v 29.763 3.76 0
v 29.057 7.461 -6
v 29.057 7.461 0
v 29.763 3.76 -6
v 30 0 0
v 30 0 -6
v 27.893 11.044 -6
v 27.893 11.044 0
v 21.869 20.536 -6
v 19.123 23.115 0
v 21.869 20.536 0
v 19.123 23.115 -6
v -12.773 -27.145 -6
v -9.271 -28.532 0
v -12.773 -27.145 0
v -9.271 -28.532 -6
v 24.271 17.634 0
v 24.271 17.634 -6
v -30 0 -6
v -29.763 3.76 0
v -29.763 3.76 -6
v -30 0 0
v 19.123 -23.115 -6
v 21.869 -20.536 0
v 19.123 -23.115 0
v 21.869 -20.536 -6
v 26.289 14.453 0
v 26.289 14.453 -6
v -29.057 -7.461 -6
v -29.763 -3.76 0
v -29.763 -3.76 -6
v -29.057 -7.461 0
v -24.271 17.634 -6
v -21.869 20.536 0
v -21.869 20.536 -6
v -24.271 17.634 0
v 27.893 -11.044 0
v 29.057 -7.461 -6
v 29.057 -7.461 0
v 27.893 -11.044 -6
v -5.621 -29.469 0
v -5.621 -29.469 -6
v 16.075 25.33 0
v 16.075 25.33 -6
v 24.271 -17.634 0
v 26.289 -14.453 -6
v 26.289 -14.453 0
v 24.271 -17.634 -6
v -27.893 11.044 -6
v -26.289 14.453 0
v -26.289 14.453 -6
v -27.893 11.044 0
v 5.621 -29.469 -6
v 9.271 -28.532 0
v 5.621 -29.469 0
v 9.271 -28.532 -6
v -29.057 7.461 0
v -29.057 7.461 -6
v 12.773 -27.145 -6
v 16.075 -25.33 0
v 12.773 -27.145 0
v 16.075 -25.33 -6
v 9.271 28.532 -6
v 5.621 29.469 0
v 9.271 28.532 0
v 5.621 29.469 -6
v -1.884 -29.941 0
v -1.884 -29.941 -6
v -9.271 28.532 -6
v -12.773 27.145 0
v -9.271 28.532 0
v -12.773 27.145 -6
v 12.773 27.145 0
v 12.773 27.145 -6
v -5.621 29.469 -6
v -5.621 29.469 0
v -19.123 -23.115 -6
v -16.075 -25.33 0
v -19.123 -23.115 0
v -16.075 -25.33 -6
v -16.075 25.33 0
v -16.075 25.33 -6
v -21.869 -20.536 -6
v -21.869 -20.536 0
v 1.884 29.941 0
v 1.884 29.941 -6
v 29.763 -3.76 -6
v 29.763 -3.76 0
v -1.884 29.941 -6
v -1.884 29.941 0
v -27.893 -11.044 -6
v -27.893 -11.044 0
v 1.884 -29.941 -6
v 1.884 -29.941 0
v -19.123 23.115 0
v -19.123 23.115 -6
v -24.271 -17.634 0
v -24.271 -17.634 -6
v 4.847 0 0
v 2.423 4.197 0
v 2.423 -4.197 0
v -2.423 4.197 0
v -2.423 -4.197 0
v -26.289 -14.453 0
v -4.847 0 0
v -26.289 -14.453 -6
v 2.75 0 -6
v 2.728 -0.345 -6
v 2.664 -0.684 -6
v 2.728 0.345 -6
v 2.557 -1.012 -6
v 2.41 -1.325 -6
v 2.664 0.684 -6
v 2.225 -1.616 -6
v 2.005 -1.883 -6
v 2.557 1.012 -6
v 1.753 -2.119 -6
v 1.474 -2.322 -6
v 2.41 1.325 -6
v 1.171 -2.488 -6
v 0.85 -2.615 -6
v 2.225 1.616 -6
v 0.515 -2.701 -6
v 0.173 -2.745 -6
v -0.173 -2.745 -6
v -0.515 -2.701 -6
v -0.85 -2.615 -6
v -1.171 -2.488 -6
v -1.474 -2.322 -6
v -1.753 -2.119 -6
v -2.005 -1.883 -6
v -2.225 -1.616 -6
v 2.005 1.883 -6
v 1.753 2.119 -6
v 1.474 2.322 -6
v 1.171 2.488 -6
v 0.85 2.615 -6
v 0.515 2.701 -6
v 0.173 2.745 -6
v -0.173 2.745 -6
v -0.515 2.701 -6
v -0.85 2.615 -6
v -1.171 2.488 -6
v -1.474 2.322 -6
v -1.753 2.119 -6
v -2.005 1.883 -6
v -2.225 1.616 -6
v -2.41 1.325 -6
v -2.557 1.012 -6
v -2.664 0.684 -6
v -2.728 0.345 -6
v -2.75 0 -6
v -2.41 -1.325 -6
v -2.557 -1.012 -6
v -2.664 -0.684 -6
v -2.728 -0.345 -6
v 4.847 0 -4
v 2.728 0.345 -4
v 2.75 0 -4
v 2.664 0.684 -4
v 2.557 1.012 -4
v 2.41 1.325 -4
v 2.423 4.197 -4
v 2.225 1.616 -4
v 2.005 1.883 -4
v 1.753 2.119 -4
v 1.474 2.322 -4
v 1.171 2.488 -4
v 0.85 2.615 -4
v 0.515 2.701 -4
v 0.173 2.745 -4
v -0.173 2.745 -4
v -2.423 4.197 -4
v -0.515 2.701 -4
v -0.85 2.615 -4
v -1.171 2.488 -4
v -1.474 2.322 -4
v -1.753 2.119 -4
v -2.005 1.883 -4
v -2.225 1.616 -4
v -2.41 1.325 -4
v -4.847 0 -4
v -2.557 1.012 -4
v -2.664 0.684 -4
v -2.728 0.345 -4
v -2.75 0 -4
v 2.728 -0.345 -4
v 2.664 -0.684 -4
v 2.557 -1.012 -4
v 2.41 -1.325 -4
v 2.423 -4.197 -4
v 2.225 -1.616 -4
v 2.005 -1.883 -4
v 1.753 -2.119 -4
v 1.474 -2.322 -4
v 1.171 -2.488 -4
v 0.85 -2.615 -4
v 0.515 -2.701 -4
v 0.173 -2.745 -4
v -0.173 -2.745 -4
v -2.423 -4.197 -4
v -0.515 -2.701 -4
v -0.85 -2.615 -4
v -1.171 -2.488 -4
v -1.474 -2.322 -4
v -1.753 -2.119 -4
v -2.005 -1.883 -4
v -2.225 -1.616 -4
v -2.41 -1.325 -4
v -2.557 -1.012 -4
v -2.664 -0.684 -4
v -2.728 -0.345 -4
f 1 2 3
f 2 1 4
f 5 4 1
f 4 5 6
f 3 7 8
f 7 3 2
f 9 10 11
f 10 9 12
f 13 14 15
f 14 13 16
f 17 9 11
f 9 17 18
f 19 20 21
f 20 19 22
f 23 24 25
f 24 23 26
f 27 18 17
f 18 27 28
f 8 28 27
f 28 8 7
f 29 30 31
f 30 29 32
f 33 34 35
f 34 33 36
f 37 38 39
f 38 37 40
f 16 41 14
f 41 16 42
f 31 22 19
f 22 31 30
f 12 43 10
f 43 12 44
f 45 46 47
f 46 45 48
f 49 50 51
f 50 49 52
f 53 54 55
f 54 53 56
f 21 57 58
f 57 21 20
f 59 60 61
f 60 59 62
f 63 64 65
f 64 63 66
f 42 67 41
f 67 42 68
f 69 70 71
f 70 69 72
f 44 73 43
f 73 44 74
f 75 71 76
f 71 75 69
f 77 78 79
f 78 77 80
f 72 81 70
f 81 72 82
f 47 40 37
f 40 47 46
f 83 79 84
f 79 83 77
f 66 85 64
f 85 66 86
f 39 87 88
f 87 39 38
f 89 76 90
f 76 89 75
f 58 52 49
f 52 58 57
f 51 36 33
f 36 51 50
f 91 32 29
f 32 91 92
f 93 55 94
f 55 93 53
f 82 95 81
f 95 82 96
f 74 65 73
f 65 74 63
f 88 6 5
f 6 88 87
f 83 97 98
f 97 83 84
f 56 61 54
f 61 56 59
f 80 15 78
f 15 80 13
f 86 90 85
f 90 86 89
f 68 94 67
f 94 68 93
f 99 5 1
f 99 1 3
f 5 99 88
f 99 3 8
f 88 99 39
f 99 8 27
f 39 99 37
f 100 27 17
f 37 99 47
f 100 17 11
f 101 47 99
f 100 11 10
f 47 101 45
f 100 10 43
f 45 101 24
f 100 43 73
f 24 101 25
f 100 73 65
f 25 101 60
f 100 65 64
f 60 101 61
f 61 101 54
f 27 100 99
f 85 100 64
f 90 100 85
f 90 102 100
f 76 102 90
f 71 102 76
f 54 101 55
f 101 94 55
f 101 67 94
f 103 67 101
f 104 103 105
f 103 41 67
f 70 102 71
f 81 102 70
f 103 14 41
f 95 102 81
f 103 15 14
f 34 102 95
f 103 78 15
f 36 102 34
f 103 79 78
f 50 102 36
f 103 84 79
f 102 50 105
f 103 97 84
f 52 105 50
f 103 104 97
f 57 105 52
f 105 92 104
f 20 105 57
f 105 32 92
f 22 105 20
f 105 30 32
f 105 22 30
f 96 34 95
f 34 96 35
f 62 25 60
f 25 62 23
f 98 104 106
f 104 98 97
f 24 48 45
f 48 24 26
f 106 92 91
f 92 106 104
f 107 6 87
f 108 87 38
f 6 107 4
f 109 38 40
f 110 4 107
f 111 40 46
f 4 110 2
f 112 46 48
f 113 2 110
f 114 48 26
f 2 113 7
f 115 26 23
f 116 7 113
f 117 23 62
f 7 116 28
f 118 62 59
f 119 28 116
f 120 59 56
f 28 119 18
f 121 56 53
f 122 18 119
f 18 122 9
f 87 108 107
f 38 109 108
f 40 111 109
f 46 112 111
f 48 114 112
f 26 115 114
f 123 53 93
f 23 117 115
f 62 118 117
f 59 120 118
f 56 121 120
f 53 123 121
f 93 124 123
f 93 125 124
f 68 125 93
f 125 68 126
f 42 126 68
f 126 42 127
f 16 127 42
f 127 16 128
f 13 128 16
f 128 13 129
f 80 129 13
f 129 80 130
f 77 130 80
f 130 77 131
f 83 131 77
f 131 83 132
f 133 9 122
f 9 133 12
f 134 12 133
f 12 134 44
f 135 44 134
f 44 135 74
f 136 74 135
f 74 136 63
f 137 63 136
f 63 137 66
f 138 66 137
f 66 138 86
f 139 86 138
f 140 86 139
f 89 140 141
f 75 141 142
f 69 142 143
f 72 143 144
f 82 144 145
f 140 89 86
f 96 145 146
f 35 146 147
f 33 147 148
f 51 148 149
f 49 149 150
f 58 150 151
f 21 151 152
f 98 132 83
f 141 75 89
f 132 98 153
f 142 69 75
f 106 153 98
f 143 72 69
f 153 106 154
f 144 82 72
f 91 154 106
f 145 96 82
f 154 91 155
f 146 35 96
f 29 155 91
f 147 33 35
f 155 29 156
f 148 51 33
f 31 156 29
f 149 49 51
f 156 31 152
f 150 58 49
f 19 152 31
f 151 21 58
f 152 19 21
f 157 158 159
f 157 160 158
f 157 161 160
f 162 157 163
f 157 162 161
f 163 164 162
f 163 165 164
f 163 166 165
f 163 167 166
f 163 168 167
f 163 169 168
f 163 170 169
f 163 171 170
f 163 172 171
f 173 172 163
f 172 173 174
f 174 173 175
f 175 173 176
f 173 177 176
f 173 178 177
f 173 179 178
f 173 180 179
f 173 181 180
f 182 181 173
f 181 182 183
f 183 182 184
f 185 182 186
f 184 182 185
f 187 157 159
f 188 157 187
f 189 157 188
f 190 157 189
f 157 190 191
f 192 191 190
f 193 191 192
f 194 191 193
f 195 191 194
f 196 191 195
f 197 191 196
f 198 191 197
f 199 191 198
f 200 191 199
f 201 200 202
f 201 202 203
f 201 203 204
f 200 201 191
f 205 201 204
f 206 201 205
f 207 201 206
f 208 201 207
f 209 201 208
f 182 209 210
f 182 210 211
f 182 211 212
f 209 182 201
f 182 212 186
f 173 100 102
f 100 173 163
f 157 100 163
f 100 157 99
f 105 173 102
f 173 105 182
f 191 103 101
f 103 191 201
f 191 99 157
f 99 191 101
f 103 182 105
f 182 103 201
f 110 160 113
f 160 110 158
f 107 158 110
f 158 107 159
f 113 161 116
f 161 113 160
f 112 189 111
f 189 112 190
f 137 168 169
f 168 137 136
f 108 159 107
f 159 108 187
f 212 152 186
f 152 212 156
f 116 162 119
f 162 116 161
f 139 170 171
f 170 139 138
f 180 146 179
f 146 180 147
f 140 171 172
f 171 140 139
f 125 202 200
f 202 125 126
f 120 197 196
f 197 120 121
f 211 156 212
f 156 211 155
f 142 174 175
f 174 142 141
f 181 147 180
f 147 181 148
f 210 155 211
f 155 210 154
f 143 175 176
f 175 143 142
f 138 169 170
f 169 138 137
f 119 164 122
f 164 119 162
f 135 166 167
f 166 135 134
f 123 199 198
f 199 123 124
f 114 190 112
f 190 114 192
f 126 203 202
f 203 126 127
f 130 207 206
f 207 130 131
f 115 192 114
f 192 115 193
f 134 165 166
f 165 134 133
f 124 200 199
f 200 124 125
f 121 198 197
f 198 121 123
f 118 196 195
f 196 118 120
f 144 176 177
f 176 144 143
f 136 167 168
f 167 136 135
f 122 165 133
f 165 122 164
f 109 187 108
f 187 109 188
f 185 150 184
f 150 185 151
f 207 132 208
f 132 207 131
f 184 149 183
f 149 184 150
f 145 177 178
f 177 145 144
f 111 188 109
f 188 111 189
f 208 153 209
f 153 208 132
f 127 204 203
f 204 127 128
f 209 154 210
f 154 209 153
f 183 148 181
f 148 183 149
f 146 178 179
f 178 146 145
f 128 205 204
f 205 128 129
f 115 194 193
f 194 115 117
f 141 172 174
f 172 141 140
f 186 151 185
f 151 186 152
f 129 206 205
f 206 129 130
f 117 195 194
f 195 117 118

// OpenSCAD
$fn = 50;


difference() {
	union() {
		translate(v = [0, 0, -6.0000000000]) {
			cylinder(h = 6.0000000000, r = 30.0000000000);
		}
		translate(v = [0, 0, -4.5000000000]) {
			cylinder(h = 4.5000000000, r = 2.8750000000);
		}
	}
	union() {
		translate(v = [0, 0, 0]) {
			rotate(a = [0, 0, 0]) {
				difference() {
					union() {
						translate(v = [0, 0, -4]) {
							#linear_extrude(height = 4) {
								polygon(points = [[4.8468000000, 0.0000000000], [2.4234000000, 4.1974519271], [-2.4234000000, 4.1974519271], [-4.8468000000, 0.0000000000], [-2.4234000000, -4.1974519271], [2.4234000000, -4.1974519271]]);
							}
						}
					}
					union();
				}
			}
		}
		#translate(v = [0, 0, -100.0000000000]) {
			cylinder(h = 200, r = 2.7500000000);
		}
	}
}
